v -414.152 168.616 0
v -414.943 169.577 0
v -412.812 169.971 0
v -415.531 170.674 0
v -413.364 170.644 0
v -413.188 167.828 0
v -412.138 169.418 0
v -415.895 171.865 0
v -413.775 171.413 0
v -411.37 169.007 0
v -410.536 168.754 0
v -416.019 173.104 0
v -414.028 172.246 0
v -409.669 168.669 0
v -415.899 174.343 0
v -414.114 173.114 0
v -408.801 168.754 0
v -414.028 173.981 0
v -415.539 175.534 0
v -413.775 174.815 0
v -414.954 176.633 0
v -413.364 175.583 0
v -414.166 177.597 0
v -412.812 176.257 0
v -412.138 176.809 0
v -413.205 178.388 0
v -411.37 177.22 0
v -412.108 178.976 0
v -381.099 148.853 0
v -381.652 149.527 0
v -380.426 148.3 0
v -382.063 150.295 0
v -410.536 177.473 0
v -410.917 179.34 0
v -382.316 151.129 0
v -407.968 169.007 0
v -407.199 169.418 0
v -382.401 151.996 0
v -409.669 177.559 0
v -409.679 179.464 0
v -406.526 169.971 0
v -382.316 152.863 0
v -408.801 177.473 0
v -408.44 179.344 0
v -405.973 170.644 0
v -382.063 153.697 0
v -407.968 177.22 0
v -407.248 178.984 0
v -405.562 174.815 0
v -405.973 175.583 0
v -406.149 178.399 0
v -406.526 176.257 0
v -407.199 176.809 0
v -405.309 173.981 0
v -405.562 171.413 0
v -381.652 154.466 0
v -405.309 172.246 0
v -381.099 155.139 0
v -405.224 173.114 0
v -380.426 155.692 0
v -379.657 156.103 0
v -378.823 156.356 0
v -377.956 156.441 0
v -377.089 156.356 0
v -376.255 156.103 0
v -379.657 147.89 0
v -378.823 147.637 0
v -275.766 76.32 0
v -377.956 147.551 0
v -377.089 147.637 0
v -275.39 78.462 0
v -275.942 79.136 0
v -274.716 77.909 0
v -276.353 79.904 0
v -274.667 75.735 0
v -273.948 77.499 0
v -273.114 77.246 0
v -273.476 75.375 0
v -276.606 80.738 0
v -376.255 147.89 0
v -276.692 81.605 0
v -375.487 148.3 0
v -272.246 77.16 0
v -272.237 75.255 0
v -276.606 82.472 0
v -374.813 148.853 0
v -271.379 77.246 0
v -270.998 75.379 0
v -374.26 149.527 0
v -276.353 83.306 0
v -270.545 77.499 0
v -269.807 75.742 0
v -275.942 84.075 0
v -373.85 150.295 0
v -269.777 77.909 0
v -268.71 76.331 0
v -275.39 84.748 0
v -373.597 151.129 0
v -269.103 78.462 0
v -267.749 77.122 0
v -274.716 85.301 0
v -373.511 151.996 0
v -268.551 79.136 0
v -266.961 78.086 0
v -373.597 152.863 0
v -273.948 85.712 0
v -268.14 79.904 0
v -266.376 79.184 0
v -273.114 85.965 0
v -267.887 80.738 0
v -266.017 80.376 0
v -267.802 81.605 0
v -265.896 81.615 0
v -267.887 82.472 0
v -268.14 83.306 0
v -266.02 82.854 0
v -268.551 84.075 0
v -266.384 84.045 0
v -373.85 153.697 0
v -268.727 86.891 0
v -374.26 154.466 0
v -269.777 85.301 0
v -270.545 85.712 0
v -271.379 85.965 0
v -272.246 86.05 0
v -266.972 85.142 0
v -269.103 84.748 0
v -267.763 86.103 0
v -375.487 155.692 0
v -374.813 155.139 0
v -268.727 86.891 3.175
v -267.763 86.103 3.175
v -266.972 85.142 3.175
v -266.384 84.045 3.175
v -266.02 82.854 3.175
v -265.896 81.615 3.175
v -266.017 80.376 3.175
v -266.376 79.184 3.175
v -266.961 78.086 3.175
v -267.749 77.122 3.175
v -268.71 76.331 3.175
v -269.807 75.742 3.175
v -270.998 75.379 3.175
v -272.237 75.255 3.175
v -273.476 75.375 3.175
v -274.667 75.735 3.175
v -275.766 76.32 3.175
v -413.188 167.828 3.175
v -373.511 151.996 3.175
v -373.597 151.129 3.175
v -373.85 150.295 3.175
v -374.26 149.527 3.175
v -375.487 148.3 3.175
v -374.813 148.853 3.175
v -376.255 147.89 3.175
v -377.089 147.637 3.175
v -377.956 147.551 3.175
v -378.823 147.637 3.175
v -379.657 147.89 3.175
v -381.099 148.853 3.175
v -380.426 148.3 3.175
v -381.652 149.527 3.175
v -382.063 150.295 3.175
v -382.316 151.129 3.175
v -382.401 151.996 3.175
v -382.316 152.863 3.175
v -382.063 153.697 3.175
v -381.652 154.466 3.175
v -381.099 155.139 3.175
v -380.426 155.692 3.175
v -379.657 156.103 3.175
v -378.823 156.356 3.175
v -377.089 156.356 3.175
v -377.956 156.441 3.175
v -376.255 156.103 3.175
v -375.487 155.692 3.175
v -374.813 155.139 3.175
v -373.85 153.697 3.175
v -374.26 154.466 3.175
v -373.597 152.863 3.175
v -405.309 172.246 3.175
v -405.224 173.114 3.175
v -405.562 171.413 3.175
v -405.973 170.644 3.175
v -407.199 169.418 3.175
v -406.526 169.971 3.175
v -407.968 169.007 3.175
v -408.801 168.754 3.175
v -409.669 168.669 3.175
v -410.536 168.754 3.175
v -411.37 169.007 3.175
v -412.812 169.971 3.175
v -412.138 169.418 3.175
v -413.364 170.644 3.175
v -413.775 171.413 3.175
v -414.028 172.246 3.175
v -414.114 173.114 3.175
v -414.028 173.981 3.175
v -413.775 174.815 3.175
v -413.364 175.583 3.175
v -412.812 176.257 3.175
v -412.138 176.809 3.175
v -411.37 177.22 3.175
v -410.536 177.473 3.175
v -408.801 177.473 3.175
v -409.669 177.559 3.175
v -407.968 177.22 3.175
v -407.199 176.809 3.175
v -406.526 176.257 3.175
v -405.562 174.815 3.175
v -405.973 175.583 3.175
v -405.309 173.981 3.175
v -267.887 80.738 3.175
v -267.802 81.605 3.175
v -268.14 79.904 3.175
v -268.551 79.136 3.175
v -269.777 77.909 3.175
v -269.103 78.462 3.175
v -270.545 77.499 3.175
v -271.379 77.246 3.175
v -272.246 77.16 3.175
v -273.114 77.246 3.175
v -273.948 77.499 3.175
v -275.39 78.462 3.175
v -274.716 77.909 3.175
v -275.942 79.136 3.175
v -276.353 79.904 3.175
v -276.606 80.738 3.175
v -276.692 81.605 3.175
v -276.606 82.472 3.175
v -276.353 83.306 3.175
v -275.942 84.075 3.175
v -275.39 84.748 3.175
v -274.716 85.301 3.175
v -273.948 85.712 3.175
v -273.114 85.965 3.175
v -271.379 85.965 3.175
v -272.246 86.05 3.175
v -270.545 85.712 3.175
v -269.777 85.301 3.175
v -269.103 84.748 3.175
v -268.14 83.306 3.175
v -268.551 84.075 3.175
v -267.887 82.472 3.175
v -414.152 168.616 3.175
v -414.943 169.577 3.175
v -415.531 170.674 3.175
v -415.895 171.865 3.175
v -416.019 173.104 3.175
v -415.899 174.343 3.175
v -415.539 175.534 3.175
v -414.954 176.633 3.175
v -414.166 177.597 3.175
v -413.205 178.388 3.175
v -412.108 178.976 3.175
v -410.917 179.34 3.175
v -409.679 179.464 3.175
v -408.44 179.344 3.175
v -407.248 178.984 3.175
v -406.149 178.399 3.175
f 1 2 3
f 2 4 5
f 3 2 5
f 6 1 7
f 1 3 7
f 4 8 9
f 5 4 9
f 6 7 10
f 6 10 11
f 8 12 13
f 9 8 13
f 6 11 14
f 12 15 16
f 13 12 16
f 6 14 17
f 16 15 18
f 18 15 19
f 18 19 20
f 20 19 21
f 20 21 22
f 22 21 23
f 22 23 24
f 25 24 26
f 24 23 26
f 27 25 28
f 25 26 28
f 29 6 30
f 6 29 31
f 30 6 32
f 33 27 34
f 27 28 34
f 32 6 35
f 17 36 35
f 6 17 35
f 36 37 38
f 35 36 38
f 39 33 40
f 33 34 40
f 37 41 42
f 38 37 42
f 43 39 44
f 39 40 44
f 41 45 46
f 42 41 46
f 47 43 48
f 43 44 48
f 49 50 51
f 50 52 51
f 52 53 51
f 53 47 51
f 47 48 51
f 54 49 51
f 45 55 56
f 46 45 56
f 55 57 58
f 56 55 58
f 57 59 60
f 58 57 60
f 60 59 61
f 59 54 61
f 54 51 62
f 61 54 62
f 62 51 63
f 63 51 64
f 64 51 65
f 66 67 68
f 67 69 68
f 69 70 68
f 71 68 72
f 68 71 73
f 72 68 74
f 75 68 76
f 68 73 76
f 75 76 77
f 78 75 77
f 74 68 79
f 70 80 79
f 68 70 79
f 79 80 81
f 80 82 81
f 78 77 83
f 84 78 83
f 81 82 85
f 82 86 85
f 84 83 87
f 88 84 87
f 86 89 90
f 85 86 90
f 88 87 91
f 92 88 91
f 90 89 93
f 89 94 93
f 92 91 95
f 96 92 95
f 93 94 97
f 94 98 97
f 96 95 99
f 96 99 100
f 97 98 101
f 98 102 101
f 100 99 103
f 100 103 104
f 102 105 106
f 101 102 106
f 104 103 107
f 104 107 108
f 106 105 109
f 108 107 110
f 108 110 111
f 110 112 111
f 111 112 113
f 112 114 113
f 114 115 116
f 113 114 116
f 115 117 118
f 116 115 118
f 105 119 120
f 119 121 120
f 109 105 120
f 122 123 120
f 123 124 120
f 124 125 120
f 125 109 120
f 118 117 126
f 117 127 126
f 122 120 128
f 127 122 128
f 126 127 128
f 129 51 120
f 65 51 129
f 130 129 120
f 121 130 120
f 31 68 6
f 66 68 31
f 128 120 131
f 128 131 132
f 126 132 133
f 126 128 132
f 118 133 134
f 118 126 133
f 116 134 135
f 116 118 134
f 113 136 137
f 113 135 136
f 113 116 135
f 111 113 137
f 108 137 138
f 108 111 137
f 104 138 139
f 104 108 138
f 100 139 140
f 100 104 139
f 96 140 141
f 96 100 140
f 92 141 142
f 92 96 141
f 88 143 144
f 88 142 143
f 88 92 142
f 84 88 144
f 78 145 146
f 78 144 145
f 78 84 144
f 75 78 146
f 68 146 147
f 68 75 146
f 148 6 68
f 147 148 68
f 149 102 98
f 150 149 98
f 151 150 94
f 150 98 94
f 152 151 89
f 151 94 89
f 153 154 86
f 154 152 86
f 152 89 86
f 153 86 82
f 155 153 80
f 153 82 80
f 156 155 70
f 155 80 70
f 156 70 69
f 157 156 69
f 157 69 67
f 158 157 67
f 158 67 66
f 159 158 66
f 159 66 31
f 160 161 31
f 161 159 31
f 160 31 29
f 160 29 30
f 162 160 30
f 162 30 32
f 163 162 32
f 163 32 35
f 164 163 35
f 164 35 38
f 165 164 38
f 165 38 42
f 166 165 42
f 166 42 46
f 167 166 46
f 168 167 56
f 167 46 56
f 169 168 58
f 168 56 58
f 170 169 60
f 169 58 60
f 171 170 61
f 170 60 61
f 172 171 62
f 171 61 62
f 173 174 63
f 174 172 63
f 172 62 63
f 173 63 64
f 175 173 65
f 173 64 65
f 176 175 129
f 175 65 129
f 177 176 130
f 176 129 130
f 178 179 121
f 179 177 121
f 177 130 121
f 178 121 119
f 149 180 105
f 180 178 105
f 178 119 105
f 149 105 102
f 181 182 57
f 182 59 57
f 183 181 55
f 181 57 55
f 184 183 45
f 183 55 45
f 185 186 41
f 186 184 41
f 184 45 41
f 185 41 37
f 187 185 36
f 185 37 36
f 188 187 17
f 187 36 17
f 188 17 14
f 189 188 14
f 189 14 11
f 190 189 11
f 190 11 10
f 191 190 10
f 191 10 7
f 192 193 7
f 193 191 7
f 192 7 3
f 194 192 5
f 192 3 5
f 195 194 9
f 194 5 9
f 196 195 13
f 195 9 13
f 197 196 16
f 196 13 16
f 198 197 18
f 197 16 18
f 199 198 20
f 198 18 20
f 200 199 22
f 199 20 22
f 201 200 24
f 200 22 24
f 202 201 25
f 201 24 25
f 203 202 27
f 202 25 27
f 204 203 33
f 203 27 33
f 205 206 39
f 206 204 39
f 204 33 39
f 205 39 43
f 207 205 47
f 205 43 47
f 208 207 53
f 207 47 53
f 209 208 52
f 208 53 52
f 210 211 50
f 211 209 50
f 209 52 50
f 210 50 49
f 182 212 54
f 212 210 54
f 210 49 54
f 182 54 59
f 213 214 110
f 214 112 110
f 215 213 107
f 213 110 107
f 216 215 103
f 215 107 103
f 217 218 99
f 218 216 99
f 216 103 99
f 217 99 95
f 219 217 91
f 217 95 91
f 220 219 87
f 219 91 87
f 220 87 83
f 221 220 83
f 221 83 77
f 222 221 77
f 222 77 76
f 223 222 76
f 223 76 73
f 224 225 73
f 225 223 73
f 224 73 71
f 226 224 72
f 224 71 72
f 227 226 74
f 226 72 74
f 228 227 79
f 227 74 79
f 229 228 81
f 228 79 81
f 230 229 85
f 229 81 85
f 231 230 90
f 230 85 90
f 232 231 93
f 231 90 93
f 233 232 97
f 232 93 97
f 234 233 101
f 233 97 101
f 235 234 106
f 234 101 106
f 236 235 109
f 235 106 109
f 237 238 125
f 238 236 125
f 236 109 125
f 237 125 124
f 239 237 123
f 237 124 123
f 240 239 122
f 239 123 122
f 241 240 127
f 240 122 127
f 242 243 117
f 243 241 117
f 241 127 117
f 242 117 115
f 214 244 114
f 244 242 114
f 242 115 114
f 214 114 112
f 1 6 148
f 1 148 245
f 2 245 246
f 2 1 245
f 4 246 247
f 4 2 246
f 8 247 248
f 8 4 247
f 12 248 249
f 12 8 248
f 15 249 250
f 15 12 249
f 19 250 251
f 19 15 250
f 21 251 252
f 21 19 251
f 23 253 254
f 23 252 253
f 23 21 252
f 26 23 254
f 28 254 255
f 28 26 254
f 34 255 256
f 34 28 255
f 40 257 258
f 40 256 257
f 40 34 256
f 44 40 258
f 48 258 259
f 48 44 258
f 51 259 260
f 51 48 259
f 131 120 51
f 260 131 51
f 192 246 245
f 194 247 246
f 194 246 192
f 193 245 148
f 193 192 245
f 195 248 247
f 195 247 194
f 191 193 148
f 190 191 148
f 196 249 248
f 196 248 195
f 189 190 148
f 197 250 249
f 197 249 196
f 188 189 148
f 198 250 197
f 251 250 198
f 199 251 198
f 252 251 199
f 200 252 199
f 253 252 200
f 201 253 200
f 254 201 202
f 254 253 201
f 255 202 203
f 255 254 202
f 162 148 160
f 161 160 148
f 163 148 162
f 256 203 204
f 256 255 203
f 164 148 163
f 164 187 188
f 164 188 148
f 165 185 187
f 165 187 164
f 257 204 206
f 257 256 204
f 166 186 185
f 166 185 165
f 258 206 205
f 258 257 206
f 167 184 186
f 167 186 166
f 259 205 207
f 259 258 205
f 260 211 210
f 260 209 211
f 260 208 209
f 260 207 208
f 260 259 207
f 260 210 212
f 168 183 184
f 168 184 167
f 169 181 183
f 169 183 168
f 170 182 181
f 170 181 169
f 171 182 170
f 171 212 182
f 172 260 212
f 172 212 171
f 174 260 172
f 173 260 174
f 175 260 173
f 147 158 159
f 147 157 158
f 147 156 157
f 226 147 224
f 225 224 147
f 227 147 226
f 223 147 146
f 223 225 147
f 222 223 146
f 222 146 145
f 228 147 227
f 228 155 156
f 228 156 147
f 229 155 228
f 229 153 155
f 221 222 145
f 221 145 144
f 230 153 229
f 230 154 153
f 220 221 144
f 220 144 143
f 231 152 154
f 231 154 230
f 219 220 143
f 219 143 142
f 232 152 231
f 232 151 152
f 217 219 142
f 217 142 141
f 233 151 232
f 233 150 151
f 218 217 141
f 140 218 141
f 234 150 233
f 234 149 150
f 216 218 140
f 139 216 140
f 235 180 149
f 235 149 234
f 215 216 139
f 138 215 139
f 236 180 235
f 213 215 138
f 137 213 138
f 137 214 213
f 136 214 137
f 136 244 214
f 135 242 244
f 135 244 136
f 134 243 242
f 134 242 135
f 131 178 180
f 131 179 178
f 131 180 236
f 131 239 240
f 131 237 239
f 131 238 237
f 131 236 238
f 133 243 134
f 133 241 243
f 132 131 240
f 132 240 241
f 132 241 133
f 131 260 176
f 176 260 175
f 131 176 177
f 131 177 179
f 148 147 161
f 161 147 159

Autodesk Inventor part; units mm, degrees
ref_plane "YZ Plane" through (0, 0, 0) normal (1, 0, 0) x (0, 1, 0)
ref_plane "XZ Plane" through (0, 0, 0) normal (0, 1, 0) x (-1, 0, 0)
ref_plane "XY Plane" through (0, 0, 0) normal (0, 0, 1) x (1, 0, 0)
sketch "Sketch1" plane through (0, 0, 0) normal (0, 0, 1) x (1, 0, 0)
  circle A0 centre (-377.9563, 151.9963) radius 4.445
  circle A1 centre (-272.2465, 81.6053) radius 4.445
  circle A2 centre (-409.6686, 173.1136) radius 4.445
  line L0 (-413.1881, 167.8282) -> (-275.7661, 76.3199) projected
  arc A3 (-406.1491, 178.399) -> (-413.1881, 167.8282) centre (-409.6686, 173.1136) ccw projected
  line L1 (-268.727, 86.8907) -> (-406.1491, 178.399) projected
  arc A4 (-275.7661, 76.3199) -> (-268.727, 86.8907) centre (-272.2465, 81.6053) ccw projected
  circle A5 centre (-358.9063, 119.0008) radius 4.445 construction
  point P0 (0, 0)
  dimension "d0" = 8.89
  dimension "d1" = 8.89
  dimension "d2" = 8.89
  dimension "d3" = 8.89
extrude "Extrusion1" add sketch "Sketch1" along normal blind 3.175
equation "\"d0\" = d3"
equation "\"d1\" = d3"
equation "\"d2\" = d3"
